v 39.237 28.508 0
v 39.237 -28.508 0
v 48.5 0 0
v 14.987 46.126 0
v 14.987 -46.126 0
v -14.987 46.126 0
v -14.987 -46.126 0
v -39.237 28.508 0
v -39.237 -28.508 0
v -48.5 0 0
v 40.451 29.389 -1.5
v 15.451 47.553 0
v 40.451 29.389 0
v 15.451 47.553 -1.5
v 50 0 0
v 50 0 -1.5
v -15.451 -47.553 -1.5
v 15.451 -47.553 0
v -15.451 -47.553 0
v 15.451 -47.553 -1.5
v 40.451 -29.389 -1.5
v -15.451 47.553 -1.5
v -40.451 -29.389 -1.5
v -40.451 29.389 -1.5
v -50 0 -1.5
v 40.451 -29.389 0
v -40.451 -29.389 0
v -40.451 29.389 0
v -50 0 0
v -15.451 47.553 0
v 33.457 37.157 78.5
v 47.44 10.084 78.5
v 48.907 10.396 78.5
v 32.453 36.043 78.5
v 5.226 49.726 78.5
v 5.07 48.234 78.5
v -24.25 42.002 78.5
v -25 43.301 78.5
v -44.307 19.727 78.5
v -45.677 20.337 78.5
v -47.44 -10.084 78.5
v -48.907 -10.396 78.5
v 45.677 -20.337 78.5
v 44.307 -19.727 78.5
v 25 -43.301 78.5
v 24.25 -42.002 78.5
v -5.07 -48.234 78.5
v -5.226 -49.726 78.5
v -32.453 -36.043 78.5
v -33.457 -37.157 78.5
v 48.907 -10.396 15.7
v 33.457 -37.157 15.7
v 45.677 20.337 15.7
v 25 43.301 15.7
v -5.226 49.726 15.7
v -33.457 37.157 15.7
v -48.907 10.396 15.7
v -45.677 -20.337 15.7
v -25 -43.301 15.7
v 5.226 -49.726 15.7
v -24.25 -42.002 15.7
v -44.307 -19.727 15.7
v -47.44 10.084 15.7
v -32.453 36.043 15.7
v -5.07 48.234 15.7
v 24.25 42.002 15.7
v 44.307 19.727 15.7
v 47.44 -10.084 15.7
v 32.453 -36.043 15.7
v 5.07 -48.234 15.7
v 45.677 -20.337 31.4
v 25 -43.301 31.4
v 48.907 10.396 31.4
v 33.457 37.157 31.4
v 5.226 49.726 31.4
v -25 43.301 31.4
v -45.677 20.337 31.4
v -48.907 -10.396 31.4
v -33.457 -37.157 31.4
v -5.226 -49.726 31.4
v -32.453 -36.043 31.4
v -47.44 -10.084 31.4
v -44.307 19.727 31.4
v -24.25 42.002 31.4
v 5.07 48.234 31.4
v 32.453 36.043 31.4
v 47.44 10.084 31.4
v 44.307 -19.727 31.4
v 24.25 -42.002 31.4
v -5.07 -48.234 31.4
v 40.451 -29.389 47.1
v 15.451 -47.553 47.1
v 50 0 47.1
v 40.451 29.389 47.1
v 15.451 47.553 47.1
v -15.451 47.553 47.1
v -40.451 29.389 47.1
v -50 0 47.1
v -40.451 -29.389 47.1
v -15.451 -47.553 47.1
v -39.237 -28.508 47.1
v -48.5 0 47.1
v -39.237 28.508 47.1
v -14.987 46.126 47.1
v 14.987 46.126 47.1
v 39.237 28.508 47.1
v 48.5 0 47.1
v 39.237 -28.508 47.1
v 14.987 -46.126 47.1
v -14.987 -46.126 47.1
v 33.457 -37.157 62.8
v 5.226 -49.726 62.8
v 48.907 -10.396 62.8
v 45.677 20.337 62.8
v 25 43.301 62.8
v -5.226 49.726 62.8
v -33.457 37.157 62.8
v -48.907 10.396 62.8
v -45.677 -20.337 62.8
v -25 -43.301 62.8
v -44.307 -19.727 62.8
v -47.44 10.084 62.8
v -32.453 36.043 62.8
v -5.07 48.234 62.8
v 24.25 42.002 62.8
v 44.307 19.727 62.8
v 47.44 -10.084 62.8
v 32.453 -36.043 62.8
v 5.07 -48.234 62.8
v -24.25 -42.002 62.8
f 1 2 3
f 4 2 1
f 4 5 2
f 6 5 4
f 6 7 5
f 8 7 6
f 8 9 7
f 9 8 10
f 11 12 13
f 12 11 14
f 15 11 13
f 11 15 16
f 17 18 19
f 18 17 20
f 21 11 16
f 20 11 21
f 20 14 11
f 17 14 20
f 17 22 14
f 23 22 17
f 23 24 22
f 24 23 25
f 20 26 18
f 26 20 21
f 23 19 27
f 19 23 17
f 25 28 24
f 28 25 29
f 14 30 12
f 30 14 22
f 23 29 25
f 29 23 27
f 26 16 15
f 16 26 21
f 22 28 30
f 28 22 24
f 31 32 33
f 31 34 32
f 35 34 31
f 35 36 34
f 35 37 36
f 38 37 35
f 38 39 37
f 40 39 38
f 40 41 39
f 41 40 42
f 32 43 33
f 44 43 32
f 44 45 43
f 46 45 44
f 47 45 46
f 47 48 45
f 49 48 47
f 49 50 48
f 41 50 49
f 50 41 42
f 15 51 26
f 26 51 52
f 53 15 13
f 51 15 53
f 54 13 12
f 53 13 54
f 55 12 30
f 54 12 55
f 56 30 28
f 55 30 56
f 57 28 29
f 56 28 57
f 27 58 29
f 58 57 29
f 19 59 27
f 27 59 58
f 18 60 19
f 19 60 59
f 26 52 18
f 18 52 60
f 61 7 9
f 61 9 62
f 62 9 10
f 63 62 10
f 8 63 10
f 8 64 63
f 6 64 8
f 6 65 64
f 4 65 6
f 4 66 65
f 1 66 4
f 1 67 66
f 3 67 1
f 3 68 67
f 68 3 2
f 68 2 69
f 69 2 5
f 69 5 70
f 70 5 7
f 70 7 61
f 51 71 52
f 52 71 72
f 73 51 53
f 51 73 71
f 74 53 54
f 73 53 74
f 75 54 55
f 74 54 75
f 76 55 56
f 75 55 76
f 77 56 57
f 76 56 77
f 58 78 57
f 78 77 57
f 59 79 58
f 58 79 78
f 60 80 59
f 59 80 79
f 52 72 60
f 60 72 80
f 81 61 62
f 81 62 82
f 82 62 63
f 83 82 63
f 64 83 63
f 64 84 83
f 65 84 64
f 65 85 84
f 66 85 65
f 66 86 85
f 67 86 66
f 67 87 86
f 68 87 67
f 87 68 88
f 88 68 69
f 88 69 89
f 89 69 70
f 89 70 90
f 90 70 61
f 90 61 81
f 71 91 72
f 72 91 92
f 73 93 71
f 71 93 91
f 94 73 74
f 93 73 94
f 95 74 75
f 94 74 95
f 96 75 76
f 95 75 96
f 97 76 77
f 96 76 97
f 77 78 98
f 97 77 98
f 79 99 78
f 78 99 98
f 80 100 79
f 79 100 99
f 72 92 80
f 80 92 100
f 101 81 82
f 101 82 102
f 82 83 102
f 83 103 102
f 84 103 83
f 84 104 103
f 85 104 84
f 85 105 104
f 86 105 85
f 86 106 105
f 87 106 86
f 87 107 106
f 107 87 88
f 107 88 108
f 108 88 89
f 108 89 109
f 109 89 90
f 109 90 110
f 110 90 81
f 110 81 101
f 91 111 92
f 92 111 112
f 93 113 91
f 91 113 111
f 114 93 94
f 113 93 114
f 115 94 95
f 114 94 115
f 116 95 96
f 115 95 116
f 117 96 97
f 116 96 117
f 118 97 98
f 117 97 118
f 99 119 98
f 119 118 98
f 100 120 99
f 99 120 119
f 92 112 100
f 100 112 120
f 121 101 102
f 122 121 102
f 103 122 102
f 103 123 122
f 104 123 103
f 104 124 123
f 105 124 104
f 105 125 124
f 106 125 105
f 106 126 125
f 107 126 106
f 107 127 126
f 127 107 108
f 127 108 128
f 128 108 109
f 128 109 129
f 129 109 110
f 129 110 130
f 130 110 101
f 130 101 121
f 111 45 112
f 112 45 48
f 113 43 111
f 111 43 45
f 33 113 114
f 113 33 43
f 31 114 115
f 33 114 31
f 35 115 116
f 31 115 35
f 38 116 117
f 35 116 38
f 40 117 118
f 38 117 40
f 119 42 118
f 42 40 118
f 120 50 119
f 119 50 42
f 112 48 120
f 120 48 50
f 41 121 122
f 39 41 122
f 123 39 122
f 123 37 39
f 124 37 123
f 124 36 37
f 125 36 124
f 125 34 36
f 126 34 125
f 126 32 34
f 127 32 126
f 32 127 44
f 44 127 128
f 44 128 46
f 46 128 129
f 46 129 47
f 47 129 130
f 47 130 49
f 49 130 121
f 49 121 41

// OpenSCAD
r = 50;
h = 80;
s = 1.5;




translate([0,0,-s])linear_extrude(height = s) circle(r = r,$fn=10);

linear_extrude(height = h-s, center = false, convexity = 10, twist = 60)
translate([0, 0, 0])
difference(){
circle(r = r,$fn=10);
circle(r = r-s,$fn=10);
}
